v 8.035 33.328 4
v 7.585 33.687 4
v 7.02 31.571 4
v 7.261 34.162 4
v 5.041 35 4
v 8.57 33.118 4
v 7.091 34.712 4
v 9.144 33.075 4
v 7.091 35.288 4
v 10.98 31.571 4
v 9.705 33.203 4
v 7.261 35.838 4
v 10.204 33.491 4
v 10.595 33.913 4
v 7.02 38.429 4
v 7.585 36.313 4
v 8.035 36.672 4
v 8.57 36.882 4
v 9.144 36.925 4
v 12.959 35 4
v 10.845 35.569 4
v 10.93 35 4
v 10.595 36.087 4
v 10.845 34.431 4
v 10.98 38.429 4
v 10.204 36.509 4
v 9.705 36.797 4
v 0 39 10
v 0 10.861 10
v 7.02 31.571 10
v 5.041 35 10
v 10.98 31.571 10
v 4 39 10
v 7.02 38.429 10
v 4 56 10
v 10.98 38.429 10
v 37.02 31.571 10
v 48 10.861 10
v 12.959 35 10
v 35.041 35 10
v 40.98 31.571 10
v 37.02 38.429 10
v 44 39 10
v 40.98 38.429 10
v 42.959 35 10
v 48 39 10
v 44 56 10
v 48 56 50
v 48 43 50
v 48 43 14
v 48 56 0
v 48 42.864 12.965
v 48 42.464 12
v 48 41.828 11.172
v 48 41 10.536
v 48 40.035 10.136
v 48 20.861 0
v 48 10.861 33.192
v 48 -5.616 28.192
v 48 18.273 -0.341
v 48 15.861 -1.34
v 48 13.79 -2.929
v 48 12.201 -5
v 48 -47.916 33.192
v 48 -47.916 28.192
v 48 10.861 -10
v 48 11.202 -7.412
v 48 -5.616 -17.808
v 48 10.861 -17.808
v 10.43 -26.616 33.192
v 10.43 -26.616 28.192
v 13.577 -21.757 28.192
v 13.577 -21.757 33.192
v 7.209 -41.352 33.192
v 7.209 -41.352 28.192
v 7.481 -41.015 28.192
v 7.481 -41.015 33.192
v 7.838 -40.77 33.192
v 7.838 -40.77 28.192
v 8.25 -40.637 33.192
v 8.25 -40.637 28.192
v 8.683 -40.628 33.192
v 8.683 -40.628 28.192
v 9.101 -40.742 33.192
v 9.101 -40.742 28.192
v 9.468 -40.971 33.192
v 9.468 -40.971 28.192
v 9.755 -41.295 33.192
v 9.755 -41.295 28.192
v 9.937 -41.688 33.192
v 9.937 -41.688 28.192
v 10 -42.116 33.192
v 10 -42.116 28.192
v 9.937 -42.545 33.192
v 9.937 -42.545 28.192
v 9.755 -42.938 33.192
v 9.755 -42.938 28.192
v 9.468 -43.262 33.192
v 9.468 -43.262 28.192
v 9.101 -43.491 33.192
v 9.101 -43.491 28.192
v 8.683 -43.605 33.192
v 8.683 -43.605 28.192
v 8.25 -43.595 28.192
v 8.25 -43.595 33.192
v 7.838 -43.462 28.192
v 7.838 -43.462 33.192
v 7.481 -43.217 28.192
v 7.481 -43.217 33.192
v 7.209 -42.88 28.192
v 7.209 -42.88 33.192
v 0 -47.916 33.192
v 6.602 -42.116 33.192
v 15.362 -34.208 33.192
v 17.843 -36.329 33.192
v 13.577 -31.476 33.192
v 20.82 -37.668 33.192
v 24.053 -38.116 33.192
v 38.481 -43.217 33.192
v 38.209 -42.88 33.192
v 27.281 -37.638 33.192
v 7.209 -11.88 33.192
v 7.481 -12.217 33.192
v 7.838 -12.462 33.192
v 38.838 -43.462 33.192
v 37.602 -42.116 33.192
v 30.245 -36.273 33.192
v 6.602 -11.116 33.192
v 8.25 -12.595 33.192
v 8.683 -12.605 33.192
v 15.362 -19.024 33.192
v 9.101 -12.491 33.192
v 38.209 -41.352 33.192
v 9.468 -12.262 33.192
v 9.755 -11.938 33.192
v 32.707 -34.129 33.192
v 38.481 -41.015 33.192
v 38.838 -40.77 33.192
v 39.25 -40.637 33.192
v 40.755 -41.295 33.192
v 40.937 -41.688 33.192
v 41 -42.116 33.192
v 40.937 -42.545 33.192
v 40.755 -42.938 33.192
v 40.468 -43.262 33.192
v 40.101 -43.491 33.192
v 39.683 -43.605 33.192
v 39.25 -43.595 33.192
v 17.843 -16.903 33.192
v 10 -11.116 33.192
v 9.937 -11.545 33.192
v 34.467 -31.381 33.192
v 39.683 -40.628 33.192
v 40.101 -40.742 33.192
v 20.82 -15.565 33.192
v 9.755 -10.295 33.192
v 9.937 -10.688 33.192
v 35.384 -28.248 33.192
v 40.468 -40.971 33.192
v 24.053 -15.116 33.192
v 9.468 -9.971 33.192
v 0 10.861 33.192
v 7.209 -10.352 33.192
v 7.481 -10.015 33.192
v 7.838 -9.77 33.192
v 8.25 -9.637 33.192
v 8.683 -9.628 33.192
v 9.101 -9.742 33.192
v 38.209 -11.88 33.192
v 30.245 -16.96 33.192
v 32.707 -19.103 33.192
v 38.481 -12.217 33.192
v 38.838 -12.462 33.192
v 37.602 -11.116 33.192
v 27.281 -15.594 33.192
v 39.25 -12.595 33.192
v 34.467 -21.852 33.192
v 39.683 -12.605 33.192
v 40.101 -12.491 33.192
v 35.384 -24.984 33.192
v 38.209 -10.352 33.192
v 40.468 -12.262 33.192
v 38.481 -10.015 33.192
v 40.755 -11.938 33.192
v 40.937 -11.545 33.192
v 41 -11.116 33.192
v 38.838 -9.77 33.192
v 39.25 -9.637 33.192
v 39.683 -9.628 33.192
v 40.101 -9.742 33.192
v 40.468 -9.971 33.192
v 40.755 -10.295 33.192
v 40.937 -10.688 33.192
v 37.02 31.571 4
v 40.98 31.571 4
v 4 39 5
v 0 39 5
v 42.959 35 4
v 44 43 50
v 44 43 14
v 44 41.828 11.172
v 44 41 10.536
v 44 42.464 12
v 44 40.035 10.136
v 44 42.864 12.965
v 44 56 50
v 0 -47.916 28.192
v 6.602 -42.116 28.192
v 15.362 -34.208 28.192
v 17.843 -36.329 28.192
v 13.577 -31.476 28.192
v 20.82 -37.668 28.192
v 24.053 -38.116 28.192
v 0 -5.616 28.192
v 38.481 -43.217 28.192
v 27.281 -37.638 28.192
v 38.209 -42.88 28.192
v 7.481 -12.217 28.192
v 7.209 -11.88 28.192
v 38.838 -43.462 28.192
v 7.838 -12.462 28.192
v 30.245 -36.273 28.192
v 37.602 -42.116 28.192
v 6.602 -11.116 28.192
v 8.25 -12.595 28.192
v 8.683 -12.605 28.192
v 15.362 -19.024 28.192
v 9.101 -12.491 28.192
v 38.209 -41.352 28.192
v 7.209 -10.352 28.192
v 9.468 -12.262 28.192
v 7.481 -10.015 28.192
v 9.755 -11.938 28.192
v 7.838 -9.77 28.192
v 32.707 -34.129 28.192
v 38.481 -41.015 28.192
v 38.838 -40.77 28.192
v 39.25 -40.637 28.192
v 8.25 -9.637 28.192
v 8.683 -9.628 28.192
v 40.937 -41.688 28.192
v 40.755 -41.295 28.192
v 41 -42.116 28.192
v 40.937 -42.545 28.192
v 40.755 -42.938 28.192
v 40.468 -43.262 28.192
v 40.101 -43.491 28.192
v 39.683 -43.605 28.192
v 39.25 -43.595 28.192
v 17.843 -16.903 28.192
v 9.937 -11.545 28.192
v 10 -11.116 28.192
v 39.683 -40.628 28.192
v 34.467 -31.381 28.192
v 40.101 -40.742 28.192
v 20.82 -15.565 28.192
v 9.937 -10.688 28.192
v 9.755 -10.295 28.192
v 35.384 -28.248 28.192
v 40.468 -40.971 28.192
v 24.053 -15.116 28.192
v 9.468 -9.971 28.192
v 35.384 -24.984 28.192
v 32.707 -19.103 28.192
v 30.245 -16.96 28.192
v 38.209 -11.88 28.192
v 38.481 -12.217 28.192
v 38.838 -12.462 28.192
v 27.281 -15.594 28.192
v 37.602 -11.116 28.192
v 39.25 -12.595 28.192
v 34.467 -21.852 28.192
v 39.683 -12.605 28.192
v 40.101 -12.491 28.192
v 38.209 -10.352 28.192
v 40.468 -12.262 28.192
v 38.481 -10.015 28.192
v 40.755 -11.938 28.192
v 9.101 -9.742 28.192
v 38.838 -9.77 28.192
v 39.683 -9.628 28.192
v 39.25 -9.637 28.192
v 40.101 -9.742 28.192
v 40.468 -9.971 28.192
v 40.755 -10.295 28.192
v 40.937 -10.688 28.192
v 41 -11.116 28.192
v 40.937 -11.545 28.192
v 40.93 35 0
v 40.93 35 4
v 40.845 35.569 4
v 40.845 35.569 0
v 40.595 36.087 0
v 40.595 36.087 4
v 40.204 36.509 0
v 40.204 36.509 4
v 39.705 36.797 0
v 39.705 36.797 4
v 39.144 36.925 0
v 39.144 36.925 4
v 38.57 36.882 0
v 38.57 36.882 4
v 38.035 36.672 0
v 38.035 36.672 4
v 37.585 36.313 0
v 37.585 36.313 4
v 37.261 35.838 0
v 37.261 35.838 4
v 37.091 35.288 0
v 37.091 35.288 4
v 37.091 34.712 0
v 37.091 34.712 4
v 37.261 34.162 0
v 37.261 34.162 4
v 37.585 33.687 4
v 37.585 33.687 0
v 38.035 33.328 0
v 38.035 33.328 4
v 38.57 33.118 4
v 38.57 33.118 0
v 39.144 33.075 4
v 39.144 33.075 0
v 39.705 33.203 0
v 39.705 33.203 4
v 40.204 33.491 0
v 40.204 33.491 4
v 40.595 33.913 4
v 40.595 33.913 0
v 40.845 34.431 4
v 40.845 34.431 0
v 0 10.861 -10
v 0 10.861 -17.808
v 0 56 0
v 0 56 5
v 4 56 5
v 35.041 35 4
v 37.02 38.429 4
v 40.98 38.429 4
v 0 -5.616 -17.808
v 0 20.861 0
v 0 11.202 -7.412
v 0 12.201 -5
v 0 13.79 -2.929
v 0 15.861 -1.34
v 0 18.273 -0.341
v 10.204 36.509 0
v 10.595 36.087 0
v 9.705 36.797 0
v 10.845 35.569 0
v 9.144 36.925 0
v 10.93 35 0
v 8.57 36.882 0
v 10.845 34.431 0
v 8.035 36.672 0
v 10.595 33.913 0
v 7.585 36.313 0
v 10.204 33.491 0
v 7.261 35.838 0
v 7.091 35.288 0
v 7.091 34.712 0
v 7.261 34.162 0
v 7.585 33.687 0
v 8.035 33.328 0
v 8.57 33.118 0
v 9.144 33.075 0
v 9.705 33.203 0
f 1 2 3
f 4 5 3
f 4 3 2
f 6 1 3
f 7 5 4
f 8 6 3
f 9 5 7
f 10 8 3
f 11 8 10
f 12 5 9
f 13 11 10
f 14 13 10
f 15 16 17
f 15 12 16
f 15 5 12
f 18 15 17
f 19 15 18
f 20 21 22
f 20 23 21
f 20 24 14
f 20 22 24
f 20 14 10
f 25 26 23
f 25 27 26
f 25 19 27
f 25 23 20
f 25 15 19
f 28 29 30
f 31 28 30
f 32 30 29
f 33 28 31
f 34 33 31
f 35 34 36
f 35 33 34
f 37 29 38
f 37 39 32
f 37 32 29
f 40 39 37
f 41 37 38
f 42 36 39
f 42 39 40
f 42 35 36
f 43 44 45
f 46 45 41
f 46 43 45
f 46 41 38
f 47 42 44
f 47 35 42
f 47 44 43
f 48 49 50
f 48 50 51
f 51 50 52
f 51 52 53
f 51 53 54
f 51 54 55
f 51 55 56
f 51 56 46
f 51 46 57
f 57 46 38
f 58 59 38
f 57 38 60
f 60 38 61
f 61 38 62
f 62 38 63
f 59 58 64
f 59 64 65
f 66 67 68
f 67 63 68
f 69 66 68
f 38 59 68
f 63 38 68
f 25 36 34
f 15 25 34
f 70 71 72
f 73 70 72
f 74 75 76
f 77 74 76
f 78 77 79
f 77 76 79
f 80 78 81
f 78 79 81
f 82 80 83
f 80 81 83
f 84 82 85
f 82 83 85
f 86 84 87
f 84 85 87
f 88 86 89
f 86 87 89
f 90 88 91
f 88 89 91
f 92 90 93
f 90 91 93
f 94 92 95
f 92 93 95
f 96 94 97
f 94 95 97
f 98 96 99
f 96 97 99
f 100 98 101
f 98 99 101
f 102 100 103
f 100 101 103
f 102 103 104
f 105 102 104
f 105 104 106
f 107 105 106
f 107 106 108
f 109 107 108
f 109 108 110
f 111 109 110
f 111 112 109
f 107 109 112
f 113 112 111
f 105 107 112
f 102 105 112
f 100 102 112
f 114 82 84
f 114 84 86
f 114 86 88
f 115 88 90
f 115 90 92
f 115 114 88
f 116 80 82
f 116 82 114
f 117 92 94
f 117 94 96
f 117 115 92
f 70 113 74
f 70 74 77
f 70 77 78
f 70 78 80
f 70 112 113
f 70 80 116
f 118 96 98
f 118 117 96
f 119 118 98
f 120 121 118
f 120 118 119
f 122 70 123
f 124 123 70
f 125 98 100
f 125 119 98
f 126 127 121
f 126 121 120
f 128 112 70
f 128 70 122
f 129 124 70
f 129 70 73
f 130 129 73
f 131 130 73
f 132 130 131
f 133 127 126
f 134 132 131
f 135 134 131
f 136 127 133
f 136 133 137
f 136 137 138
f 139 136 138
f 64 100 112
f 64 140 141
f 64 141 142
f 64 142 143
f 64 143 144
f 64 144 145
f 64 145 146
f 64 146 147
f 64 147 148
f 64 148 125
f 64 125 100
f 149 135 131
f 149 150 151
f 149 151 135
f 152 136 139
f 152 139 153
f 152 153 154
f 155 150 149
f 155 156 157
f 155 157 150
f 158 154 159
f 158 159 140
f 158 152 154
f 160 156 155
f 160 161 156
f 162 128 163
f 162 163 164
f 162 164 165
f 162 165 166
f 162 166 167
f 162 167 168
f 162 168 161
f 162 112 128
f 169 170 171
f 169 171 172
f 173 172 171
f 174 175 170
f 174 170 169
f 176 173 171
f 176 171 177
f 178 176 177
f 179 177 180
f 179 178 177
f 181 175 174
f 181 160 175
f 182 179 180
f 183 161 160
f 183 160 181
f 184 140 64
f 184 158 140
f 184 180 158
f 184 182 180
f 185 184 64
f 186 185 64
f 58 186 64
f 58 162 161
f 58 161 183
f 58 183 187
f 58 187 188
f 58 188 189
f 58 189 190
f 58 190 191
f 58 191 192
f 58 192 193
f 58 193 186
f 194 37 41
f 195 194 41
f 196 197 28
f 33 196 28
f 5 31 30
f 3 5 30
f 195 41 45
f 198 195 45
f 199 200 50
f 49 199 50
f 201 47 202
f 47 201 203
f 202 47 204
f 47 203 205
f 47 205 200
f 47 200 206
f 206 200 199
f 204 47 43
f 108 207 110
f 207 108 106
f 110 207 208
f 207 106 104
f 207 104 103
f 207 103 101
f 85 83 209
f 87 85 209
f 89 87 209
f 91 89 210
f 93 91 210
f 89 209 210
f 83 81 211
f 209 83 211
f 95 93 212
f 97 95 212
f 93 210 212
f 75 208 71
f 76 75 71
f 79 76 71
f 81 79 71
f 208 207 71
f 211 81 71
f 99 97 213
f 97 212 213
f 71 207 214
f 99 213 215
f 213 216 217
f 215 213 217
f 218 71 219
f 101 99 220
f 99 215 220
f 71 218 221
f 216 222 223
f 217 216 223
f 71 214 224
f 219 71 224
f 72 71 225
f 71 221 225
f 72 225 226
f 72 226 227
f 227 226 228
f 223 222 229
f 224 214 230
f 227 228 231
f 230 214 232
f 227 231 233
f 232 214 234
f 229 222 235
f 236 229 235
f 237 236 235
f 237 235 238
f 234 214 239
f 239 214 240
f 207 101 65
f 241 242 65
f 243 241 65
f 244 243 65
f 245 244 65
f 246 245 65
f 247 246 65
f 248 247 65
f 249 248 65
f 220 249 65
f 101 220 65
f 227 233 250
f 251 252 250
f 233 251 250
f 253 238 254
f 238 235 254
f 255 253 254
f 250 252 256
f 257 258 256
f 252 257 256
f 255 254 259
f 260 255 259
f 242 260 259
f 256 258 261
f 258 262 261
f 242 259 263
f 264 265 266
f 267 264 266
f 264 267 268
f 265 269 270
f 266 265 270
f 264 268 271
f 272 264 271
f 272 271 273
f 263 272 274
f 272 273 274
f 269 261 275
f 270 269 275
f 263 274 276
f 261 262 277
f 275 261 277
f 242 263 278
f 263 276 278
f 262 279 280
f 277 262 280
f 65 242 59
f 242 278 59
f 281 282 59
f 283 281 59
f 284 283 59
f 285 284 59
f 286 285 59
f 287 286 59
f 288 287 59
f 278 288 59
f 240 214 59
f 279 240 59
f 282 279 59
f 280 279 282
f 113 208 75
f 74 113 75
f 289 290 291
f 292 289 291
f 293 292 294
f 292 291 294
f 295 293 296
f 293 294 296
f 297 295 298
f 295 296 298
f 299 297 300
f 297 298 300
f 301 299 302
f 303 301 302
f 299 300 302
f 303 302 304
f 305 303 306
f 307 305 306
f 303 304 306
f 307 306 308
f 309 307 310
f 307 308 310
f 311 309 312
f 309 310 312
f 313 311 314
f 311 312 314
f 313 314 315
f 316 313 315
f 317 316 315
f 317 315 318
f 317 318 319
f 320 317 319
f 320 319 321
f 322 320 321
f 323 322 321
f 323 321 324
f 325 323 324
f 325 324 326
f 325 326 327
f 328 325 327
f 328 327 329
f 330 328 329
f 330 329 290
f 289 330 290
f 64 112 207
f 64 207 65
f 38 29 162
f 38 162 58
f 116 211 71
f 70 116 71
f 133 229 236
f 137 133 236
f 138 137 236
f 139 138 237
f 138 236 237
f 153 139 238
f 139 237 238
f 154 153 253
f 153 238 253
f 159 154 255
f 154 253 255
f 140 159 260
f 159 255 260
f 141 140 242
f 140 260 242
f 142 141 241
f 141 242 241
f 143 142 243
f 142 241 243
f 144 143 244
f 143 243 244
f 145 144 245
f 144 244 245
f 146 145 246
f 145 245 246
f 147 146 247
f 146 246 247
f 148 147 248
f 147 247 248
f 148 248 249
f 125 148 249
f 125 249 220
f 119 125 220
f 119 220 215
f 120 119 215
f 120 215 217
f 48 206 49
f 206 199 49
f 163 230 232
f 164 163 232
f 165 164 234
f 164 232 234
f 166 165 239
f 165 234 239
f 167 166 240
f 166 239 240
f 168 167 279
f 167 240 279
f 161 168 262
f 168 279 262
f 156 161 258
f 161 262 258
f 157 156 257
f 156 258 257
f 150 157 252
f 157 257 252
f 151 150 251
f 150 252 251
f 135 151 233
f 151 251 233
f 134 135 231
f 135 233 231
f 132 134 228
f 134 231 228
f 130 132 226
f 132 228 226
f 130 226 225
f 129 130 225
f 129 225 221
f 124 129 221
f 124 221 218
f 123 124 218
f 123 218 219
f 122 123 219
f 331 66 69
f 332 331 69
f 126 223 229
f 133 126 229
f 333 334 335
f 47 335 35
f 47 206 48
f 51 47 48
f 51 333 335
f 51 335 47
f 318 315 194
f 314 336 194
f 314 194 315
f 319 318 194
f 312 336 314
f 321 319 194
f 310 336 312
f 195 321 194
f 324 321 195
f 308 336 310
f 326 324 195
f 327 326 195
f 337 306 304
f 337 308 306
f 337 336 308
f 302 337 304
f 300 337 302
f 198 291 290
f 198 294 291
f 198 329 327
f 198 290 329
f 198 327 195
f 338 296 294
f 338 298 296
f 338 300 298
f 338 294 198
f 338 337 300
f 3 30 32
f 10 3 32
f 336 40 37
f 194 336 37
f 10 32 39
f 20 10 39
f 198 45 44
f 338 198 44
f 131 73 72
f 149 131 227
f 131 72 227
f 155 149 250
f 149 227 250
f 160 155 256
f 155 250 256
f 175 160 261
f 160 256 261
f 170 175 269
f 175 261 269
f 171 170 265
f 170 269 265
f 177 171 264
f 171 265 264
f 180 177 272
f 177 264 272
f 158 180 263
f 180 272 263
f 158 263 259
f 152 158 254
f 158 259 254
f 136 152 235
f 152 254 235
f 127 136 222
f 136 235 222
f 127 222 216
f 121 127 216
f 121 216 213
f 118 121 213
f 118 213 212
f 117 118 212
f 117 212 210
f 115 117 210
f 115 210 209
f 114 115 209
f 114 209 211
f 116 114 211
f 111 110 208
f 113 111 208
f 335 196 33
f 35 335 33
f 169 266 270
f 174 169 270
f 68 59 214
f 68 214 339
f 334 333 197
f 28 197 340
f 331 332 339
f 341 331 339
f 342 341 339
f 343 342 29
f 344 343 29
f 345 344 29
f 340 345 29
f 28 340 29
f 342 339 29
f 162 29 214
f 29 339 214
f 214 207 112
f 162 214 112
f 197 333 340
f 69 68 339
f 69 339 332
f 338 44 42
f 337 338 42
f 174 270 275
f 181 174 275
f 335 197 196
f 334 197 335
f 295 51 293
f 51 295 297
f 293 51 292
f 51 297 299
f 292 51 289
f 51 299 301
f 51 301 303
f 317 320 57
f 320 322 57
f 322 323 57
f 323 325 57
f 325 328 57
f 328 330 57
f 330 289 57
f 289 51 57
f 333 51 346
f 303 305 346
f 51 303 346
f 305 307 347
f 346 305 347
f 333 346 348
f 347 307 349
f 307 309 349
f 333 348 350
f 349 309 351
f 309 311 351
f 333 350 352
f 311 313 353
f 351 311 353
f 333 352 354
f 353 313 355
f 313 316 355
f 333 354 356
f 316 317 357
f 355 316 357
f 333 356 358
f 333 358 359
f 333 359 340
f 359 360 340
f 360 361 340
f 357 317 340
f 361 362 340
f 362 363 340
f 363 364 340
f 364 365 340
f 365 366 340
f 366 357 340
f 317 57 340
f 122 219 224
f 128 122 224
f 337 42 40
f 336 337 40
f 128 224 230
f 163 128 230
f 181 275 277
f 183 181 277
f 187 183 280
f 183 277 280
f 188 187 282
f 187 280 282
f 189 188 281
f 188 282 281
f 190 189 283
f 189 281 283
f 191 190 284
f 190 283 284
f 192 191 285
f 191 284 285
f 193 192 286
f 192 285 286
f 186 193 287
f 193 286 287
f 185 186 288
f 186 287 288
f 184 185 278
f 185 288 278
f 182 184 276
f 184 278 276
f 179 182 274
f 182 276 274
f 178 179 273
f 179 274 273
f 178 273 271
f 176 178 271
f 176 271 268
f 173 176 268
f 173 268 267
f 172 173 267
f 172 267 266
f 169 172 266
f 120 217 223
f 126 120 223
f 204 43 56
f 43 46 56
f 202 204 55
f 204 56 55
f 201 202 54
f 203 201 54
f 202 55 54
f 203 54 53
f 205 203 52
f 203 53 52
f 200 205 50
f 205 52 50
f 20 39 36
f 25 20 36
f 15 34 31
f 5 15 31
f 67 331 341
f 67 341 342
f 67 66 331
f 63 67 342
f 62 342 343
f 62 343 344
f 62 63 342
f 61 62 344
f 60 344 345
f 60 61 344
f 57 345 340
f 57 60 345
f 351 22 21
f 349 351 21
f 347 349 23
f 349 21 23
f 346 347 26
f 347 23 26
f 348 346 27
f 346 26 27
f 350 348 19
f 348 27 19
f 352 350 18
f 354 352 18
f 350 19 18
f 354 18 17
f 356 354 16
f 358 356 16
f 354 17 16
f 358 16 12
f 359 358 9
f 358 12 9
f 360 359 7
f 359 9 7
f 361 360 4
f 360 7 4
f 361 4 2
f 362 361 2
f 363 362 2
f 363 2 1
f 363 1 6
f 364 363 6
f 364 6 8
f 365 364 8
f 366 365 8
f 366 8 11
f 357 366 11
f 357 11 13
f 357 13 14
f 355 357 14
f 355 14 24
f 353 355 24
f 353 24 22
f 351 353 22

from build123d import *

# Parameters (mm, degrees)
SKETCH1_W            = 48
SKETCH1_H            = 53
BOSS_EXTRUDE1_DEPTH  = 10
SKETCH2_W            = 48
SKETCH2_H            = 5.616325
BOSS_EXTRUDE2_DEPTH  = 33.1917878
SKETCH4_W            = 4
SKETCH4_H            = 10
BOSS_EXTRUDE4_DEPTH  = 40
SKETCH5_W            = 48
SKETCH5_H            = 10.8609375
BOSS_EXTRUDE5_DEPTH  = 23.1917878
SKETCH6_W            = 48
SKETCH6_H            = 5
BOSS_EXTRUDE6_DEPTH  = 42.3
SKETCH7_W            = 12.8082122
SKETCH7_H            = 16.4772625
BOSS_EXTRUDE7_DEPTH  = 48
CUT_EXTRUDE1_REACH   = 84.426
SKETCH8_R            = 11.5
SKETCH8_R_2          = 1.5
FILLET1_R            = 10
FILLET2_R            = 4
SKETCH9_W            = 5
SKETCH9_H            = 16.4772625
BOSS_EXTRUDE9_DEPTH  = 48
CUT_EXTRUDE2_DEPTH   = 6
SKETCH11_R           = 1.9304
CUT_EXTRUDE3_DEPTH   = 6
BOSS_EXTRUDE11_DEPTH = 3
SKETCH14_W           = 45
SKETCH14_H           = 17
CUT_EXTRUDE4_DEPTH   = 4
CUT_EXTRUDE5_REACH   = 88.925


with BuildPart() as part:
    # Sketch1 → Boss-Extrude1 (new body)
    with BuildSketch(Plane.XY):
        with Locations((24, 26.5)):
            Rectangle(SKETCH1_W, SKETCH1_H)
    extrude(amount=BOSS_EXTRUDE1_DEPTH)

    # Sketch2 → Boss-Extrude2 (add)
    with BuildSketch(Plane(origin=(0, 0, 0), x_dir=(-1, 0, 0), z_dir=(0, 0, -1))):
        with Locations((-24, -2.8081625)):
            Rectangle(SKETCH2_W, SKETCH2_H)
    extrude(amount=-BOSS_EXTRUDE2_DEPTH)

    # Sketch4 → Boss-Extrude4 (add)
    with BuildSketch(Plane.XY.offset(10)):
        with Locations((2, 48)):
            Rectangle(SKETCH4_W, SKETCH4_H)
        with Locations((46, 48)):
            Rectangle(SKETCH4_W, SKETCH4_H)
    extrude(amount=BOSS_EXTRUDE4_DEPTH)

    # Sketch5 → Boss-Extrude5 (add)
    with BuildSketch(Plane.XY.offset(10)):
        with Locations((24, 5.43046875)):
            Rectangle(SKETCH5_W, SKETCH5_H)
    extrude(amount=BOSS_EXTRUDE5_DEPTH)

    # Sketch6 → Boss-Extrude6 (add)
    with BuildSketch(Plane.XZ.offset(5.616325)):
        with Locations((24, 30.6917878)):
            Rectangle(SKETCH6_W, SKETCH6_H)
    extrude(amount=BOSS_EXTRUDE6_DEPTH)

    # Sketch7 → Boss-Extrude7 (add)
    with BuildSketch(Plane.ZY):
        with Locations((-6.4041061, 2.62230625)):
            Rectangle(SKETCH7_W, SKETCH7_H)
    extrude(amount=-BOSS_EXTRUDE7_DEPTH)

    # Sketch8 → Cut-Extrude1 (cut, up to next)
    with BuildSketch(Plane(origin=(0, 0, 28.1917878), x_dir=(-1, 0, 0), z_dir=(0, 0, -1)), mode=Mode.PRIVATE) as cut_extrude1_sk1:
        with Locations((-24, -26.616325)):
            Circle(SKETCH8_R)
    cut_extrude1_tool1 = extrude(cut_extrude1_sk1.sketch, amount=-CUT_EXTRUDE1_REACH, mode=Mode.PRIVATE) & part.part
    # Sketch8 → Cut-Extrude1 (cut, up to next)
    with BuildSketch(Plane(origin=(0, 0, 28.1917878), x_dir=(-1, 0, 0), z_dir=(0, 0, -1)), mode=Mode.PRIVATE) as cut_extrude1_sk2:
        with Locations((-39.5, -11.116325)):
            Circle(SKETCH8_R_2)
    cut_extrude1_tool2 = extrude(cut_extrude1_sk2.sketch, amount=-CUT_EXTRUDE1_REACH, mode=Mode.PRIVATE) & part.part
    # Sketch8 → Cut-Extrude1 (cut, up to next)
    with BuildSketch(Plane(origin=(0, 0, 28.1917878), x_dir=(-1, 0, 0), z_dir=(0, 0, -1)), mode=Mode.PRIVATE) as cut_extrude1_sk3:
        with Locations((-39.5, -42.116325)):
            Circle(SKETCH8_R_2)
    cut_extrude1_tool3 = extrude(cut_extrude1_sk3.sketch, amount=-CUT_EXTRUDE1_REACH, mode=Mode.PRIVATE) & part.part
    # Sketch8 → Cut-Extrude1 (cut, up to next)
    with BuildSketch(Plane(origin=(0, 0, 28.1917878), x_dir=(-1, 0, 0), z_dir=(0, 0, -1)), mode=Mode.PRIVATE) as cut_extrude1_sk4:
        with Locations((-8.5, -11.116325)):
            Circle(SKETCH8_R_2)
    cut_extrude1_tool4 = extrude(cut_extrude1_sk4.sketch, amount=-CUT_EXTRUDE1_REACH, mode=Mode.PRIVATE) & part.part
    # Sketch8 → Cut-Extrude1 (cut, up to next)
    with BuildSketch(Plane(origin=(0, 0, 28.1917878), x_dir=(-1, 0, 0), z_dir=(0, 0, -1)), mode=Mode.PRIVATE) as cut_extrude1_sk5:
        with Locations((-8.5, -42.116325)):
            Circle(SKETCH8_R_2)
    cut_extrude1_tool5 = extrude(cut_extrude1_sk5.sketch, amount=-CUT_EXTRUDE1_REACH, mode=Mode.PRIVATE) & part.part
    add(cut_extrude1_tool1.solids().sort_by_distance((24, -26.616325, 28.191788))[0], mode=Mode.SUBTRACT)
    add(cut_extrude1_tool2.solids().sort_by_distance((39.5, -11.116325, 28.191788))[0], mode=Mode.SUBTRACT)
    add(cut_extrude1_tool3.solids().sort_by_distance((39.5, -42.116325, 28.191788))[0], mode=Mode.SUBTRACT)
    add(cut_extrude1_tool4.solids().sort_by_distance((8.5, -11.116325, 28.191788))[0], mode=Mode.SUBTRACT)
    add(cut_extrude1_tool5.solids().sort_by_distance((8.5, -42.116325, 28.191788))[0], mode=Mode.SUBTRACT)

    # Fillet1
    fillet1_edges = [part.edges().sort_by_distance(p)[0] for p in [
        (24, 10.8609375, 0),
    ]]
    fillet(fillet1_edges, radius=FILLET1_R)

    # Fillet2
    fillet2_edges = [part.edges().sort_by_distance(p)[0] for p in [
        (2, 43, 10),
        (46, 43, 10),
    ]]
    fillet(fillet2_edges, radius=FILLET2_R)

    # Sketch9 → Boss-Extrude9 (add)
    with BuildSketch(Plane(origin=(48, 0, 0), x_dir=(0, 0, -1), z_dir=(1, 0, 0))):
        with Locations((15.3082122, 2.62230625)):
            Rectangle(SKETCH9_W, SKETCH9_H)
    extrude(amount=-BOSS_EXTRUDE9_DEPTH)

    # Sketch10 → Cut-Extrude2 (cut)
    with BuildSketch(Plane.XY.offset(10)):
        Polygon((7.020265927, 38.429), (5.040531854, 35), (7.020265927, 31.571), (10.979734073, 31.571), (12.959468146, 35), (10.979734073, 38.429), align=None)
        Polygon((37.020265927, 31.571), (40.979734073, 31.571), (42.959468146, 35), (40.979734073, 38.429), (37.020265927, 38.429), (35.040531854, 35), align=None)
    extrude(amount=-CUT_EXTRUDE2_DEPTH, mode=Mode.SUBTRACT)

    # Sketch11 → Cut-Extrude3 (cut)
    with BuildSketch(Plane.XY.offset(4)):
        with Locations((9, 35)):
            Circle(SKETCH11_R)
        with Locations((39, 35)):
            Circle(SKETCH11_R)
    extrude(amount=-CUT_EXTRUDE3_DEPTH, mode=Mode.SUBTRACT)

    # Sketch12 → Boss-Extrude11 (add)
    with BuildSketch(Plane(origin=(0, 53, 0), x_dir=(1, 0, 0), z_dir=(0, 1, 0))):
        Polygon((0, 0), (0, -50), (4, -50), (4, -10), (44, -10), (44, -50), (48, -50), (48, 0), align=None)
    extrude(amount=BOSS_EXTRUDE11_DEPTH)

    # Sketch14 → Cut-Extrude4 (cut)
    with BuildSketch(Plane.ZY):
        with Locations((27.5, 47.5)):
            Rectangle(SKETCH14_W, SKETCH14_H)
    extrude(amount=-CUT_EXTRUDE4_DEPTH, mode=Mode.SUBTRACT)

    # Sketch15 → Cut-Extrude5 (cut, up to next)
    with BuildSketch(Plane(origin=(0, 0, 28.1917878), x_dir=(-1, 0, 0), z_dir=(0, 0, -1)), mode=Mode.PRIVATE) as cut_extrude5_sk1:
        with BuildLine():
            Line((-10.43028611, -26.616325), (-13.577258578, -21.756647928))
            ThreePointArc((-13.577258578, -21.756647928), (-12.772544225, -24.127502624), (-12.5, -26.616325))
            ThreePointArc((-12.5, -26.616325), (-12.772544225, -29.105147376), (-13.577258578, -31.476002072))
            Line((-13.577258578, -31.476002072), (-10.43028611, -26.616325))
        make_face()
    cut_extrude5_tool1 = extrude(cut_extrude5_sk1.sketch, amount=-CUT_EXTRUDE5_REACH, mode=Mode.PRIVATE) & part.part
    # Sketch15 → Cut-Extrude5 (cut, up to next)
    with BuildSketch(Plane(origin=(0, 0, 28.1917878), x_dir=(-1, 0, 0), z_dir=(0, 0, -1)), mode=Mode.PRIVATE) as cut_extrude5_sk2:
        with BuildLine():
            Line((-6.602022713, -11.116325), (-7.2091403, -10.352334664))
            ThreePointArc((-7.2091403, -10.352334664), (-7.053229536, -10.720275477), (-7, -11.116325))
            ThreePointArc((-7, -11.116325), (-7.053229536, -11.512374523), (-7.2091403, -11.880315336))
            Line((-7.2091403, -11.880315336), (-6.602022713, -11.116325))
        make_face()
    cut_extrude5_tool2 = extrude(cut_extrude5_sk2.sketch, amount=-CUT_EXTRUDE5_REACH, mode=Mode.PRIVATE) & part.part
    # Sketch15 → Cut-Extrude5 (cut, up to next)
    with BuildSketch(Plane(origin=(0, 0, 28.1917878), x_dir=(-1, 0, 0), z_dir=(0, 0, -1)), mode=Mode.PRIVATE) as cut_extrude5_sk3:
        with BuildLine():
            Line((-37.602022713, -11.116325), (-38.2091403, -10.352334664))
            ThreePointArc((-38.2091403, -10.352334664), (-38.053229536, -10.720275477), (-38, -11.116325))
            ThreePointArc((-38, -11.116325), (-38.053229536, -11.512374523), (-38.2091403, -11.880315336))
            Line((-38.2091403, -11.880315336), (-37.602022713, -11.116325))
        make_face()
    cut_extrude5_tool3 = extrude(cut_extrude5_sk3.sketch, amount=-CUT_EXTRUDE5_REACH, mode=Mode.PRIVATE) & part.part
    # Sketch15 → Cut-Extrude5 (cut, up to next)
    with BuildSketch(Plane(origin=(0, 0, 28.1917878), x_dir=(-1, 0, 0), z_dir=(0, 0, -1)), mode=Mode.PRIVATE) as cut_extrude5_sk4:
        with BuildLine():
            Line((-37.602022713, -42.116325), (-38.2091403, -41.352334664))
            ThreePointArc((-38.2091403, -41.352334664), (-38.053229536, -41.720275477), (-38, -42.116325))
            ThreePointArc((-38, -42.116325), (-38.053229536, -42.512374523), (-38.2091403, -42.880315336))
            Line((-38.2091403, -42.880315336), (-37.602022713, -42.116325))
        make_face()
    cut_extrude5_tool4 = extrude(cut_extrude5_sk4.sketch, amount=-CUT_EXTRUDE5_REACH, mode=Mode.PRIVATE) & part.part
    # Sketch15 → Cut-Extrude5 (cut, up to next)
    with BuildSketch(Plane(origin=(0, 0, 28.1917878), x_dir=(-1, 0, 0), z_dir=(0, 0, -1)), mode=Mode.PRIVATE) as cut_extrude5_sk5:
        with BuildLine():
            Line((-6.602022713, -42.116325), (-7.2091403, -41.352334664))
            ThreePointArc((-7.2091403, -41.352334664), (-7.053229536, -41.720275477), (-7, -42.116325))
            ThreePointArc((-7, -42.116325), (-7.053229536, -42.512374523), (-7.2091403, -42.880315336))
            Line((-7.2091403, -42.880315336), (-6.602022713, -42.116325))
        make_face()
    cut_extrude5_tool5 = extrude(cut_extrude5_sk5.sketch, amount=-CUT_EXTRUDE5_REACH, mode=Mode.PRIVATE) & part.part
    add(cut_extrude5_tool1.solids().sort_by_distance((12.00141, -26.616325, 28.191788))[0], mode=Mode.SUBTRACT)
    add(cut_extrude5_tool2.solids().sort_by_distance((6.903574, -11.116325, 28.191788))[0], mode=Mode.SUBTRACT)
    add(cut_extrude5_tool3.solids().sort_by_distance((37.903574, -11.116325, 28.191788))[0], mode=Mode.SUBTRACT)
    add(cut_extrude5_tool4.solids().sort_by_distance((37.903574, -42.116325, 28.191788))[0], mode=Mode.SUBTRACT)
    add(cut_extrude5_tool5.solids().sort_by_distance((6.903574, -42.116325, 28.191788))[0], mode=Mode.SUBTRACT)


solid = part.part
